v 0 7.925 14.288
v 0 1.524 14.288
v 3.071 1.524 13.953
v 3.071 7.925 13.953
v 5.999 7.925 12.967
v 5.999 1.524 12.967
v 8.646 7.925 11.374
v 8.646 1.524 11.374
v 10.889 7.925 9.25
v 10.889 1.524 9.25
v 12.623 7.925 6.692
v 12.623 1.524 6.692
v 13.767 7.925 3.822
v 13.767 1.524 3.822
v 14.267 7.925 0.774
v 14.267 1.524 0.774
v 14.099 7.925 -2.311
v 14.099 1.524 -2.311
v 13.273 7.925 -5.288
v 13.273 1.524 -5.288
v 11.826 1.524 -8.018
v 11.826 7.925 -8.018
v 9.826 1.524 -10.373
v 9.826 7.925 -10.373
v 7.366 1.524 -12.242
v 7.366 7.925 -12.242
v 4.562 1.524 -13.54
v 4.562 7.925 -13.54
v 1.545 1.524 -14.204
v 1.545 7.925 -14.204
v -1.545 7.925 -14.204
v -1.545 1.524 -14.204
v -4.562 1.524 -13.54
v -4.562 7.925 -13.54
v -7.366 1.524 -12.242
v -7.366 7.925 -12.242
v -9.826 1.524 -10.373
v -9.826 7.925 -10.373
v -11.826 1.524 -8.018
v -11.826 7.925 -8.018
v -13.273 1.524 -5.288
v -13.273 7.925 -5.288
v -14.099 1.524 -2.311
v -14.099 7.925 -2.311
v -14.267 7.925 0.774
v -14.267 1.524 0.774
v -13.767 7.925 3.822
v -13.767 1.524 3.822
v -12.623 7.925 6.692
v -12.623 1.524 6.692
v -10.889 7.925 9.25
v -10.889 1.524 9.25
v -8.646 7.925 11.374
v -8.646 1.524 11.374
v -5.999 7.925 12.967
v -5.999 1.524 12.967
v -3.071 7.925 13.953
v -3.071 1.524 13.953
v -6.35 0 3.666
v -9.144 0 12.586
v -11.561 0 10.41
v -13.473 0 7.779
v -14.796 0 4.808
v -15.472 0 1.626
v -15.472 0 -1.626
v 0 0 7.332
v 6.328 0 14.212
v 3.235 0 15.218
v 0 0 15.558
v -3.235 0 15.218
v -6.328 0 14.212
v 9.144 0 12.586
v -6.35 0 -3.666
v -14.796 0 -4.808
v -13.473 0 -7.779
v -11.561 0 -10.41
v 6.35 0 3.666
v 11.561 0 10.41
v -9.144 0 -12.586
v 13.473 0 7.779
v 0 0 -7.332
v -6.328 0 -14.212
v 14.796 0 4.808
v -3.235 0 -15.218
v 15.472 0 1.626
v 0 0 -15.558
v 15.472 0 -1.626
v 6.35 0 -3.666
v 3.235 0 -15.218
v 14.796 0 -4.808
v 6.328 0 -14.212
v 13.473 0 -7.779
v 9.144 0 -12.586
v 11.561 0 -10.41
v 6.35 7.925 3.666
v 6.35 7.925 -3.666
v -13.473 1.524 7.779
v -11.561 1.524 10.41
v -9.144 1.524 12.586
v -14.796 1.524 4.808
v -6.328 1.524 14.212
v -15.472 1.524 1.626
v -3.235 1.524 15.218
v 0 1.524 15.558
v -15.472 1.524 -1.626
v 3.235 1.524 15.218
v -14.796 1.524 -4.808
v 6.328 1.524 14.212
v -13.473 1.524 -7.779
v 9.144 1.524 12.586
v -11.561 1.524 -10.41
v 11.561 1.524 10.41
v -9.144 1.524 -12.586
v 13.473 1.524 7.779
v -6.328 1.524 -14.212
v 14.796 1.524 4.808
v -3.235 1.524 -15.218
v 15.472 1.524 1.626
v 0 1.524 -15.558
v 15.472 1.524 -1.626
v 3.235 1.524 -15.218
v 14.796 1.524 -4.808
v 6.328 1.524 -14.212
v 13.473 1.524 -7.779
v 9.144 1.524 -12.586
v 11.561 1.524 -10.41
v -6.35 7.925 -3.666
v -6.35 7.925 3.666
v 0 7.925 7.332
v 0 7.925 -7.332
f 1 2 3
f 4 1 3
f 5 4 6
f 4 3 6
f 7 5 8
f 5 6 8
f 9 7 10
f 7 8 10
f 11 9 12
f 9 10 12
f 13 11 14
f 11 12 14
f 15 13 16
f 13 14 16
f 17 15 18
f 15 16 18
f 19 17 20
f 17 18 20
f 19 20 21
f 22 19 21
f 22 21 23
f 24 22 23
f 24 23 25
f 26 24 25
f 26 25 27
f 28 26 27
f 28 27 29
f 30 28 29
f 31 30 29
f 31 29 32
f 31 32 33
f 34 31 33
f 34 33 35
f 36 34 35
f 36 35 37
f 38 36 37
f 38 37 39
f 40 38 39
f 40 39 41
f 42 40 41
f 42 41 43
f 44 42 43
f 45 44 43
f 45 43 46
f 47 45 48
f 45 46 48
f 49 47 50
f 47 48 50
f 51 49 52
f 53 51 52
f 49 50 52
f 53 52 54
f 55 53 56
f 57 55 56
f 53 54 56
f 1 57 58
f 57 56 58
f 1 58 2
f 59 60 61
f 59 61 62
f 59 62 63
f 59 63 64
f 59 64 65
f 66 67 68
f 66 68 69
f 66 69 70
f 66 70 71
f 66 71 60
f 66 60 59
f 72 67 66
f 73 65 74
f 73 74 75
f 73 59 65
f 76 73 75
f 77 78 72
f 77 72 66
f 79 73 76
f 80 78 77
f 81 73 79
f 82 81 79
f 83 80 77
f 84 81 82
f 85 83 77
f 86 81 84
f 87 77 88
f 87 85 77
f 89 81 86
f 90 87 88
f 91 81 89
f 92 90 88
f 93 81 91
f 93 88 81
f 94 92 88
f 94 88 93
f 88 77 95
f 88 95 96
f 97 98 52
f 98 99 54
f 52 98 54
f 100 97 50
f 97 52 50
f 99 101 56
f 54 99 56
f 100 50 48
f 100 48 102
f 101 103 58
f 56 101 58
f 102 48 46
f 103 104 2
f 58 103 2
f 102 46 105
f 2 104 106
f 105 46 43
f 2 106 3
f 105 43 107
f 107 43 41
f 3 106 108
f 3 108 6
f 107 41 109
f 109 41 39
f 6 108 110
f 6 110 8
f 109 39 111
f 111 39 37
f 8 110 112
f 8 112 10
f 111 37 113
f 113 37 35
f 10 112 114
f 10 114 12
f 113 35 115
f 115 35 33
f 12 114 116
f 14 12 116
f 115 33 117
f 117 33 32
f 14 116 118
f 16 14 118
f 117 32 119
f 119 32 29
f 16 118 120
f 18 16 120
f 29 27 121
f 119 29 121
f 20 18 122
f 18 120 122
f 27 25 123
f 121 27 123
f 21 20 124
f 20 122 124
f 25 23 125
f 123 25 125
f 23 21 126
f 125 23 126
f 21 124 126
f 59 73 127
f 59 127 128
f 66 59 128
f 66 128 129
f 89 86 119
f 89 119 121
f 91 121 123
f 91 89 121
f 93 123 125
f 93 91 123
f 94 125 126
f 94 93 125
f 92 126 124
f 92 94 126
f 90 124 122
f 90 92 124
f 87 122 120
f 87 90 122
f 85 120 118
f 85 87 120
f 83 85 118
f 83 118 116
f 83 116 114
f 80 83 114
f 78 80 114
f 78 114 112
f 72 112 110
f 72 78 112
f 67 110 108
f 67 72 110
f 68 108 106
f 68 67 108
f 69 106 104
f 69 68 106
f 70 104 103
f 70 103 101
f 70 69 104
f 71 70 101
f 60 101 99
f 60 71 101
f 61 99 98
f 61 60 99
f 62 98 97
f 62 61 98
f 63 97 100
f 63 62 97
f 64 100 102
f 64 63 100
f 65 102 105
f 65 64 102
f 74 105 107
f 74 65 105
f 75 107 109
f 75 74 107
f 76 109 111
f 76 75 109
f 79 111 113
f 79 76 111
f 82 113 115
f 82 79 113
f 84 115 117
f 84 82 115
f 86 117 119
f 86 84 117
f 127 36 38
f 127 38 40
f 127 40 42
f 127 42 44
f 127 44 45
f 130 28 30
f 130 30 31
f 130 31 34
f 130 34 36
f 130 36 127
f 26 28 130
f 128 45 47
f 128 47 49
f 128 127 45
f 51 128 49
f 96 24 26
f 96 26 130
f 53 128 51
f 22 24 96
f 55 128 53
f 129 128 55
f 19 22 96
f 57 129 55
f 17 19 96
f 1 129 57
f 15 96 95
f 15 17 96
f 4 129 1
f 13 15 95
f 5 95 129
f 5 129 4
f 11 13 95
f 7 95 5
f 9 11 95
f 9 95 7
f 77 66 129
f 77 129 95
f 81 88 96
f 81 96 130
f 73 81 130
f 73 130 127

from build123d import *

# Parameters (mm, degrees)
SKETCH1_R           = 14.2875
BOSS_EXTRUDE1_DEPTH = 7.9248
SKETCH2_R           = 15.5575
SKETCH2_R_2         = 14.2875
BOSS_EXTRUDE2_DEPTH = 1.524


with BuildPart() as part:
    # Sketch1 → Boss-Extrude1 (new body)
    with BuildSketch(Plane(origin=(0, 0, 0), x_dir=(1, 0, 0), z_dir=(0, 1, 0))):
        with Locations(Location((0, 0, 0), (0, 0, 270))):
            Circle(SKETCH1_R)
        Polygon((6.35, -3.666174209), (6.35, 3.666174209), (0, 7.332348419), (-6.35, 3.666174209), (-6.35, -3.666174209), (0, -7.332348419), align=None, mode=Mode.SUBTRACT)
    extrude(amount=BOSS_EXTRUDE1_DEPTH)

    # Sketch2 → Boss-Extrude2 (add)
    with BuildSketch(Plane.XZ):
        with Locations(Location((0, 0, 0), (0, 0, 270))):
            Circle(SKETCH2_R)
        with Locations(Location((0, 0, 0), (0, 0, 270))):
            Circle(SKETCH2_R_2, mode=Mode.SUBTRACT)
    extrude(amount=-BOSS_EXTRUDE2_DEPTH)


solid = part.part
